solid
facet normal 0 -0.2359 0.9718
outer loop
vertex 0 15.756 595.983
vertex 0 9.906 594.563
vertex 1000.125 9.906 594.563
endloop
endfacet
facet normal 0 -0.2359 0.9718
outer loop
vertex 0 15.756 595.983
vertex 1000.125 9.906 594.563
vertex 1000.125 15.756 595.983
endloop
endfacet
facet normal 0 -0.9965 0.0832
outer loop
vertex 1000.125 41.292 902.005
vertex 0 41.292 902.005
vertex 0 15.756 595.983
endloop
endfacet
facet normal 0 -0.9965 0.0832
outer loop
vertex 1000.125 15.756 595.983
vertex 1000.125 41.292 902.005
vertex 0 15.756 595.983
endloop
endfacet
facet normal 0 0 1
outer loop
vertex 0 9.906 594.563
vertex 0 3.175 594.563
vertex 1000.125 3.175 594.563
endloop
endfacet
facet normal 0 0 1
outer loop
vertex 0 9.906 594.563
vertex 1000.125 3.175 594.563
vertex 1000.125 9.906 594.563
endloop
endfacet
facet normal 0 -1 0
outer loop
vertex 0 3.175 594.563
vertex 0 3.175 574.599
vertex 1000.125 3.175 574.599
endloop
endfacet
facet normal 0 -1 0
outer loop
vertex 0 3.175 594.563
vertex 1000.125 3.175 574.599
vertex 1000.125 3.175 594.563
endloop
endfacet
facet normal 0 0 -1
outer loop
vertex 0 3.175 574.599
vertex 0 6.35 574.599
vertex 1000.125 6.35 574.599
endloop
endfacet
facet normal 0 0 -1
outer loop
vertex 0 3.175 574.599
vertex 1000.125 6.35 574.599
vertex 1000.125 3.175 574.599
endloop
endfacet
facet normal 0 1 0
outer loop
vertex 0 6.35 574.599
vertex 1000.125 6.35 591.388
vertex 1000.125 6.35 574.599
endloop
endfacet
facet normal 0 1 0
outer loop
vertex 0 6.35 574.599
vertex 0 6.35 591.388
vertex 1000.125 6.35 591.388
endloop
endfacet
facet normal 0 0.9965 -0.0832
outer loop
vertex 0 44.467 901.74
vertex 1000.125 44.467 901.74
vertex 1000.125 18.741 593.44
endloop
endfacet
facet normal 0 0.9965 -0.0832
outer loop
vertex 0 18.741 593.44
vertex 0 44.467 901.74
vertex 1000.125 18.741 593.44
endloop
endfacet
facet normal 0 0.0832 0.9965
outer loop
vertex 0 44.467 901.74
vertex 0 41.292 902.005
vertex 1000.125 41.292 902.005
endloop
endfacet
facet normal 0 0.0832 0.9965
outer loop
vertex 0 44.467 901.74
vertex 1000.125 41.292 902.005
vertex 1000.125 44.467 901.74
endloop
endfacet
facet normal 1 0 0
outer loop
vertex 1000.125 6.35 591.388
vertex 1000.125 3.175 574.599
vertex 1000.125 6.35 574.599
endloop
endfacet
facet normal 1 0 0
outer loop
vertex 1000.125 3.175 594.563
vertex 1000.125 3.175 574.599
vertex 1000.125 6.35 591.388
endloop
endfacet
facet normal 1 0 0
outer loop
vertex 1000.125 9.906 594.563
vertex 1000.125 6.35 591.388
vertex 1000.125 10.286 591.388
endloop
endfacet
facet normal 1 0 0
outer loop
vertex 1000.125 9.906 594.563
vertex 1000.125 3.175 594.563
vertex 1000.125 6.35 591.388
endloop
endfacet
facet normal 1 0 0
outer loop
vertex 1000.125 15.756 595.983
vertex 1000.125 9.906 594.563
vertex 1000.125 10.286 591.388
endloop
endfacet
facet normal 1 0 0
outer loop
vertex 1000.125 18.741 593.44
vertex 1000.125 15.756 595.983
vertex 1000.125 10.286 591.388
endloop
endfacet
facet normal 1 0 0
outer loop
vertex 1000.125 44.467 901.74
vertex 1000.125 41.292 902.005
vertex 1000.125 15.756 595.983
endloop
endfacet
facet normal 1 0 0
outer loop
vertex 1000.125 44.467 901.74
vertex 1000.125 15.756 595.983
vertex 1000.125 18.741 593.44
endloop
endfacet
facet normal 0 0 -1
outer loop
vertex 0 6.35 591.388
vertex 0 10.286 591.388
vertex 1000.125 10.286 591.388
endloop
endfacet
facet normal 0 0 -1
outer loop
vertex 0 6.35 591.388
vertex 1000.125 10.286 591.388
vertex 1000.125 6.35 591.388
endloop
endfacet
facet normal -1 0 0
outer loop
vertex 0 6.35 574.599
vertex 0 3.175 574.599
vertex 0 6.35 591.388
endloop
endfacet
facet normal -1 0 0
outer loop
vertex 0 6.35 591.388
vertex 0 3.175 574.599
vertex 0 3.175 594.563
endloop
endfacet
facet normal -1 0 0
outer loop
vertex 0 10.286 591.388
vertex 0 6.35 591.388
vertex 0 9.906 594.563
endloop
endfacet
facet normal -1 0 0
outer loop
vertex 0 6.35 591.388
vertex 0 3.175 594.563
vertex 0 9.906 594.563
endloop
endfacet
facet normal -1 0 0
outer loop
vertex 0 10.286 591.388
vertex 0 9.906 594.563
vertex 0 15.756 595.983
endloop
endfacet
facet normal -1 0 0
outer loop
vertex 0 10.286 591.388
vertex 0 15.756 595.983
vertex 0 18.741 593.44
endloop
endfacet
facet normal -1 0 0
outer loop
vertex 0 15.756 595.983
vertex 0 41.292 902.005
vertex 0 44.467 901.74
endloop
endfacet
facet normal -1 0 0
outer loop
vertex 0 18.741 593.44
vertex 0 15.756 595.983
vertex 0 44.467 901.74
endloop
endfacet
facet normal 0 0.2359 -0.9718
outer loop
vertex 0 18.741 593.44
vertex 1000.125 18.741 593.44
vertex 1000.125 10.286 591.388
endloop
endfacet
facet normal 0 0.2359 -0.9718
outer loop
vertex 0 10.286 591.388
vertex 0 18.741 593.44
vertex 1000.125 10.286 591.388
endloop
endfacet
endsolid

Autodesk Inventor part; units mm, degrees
ref_plane "YZ Plane" through (0, 0, 0) normal (1, 0, 0) x (0, 1, 0)
ref_plane "XZ Plane" through (0, 0, 0) normal (0, 1, 0) x (-1, 0, 0)
ref_plane "XY Plane" through (0, 0, 0) normal (0, 0, 1) x (1, 0, 0)
sketch "Sketch1" plane through (0, 0, 0) normal (1, 0, 0) x (0, 1, 0)
  line L0 (0, 0) -> (0, 597.7382)
  line L1 (0, 0) -> (3.175, 0)
  line L2 (3.175, 0) -> (3.175, 594.5632)
  line L3 (3.175, 594.5632) -> (9.906, 594.5632)
  line L4 (9.906, 594.5632) -> (15.756, 595.9828)
  line L5 (0, 597.7382) -> (9.5263, 597.7382)
  line L6 (9.5263, 597.7382) -> (12.7824, 598.5283)
  line L7 (41.2921, 902.0052) -> (15.756, 595.9828)
  line L8 (12.7824, 598.5283) -> (38.1281, 902.2692)
  line L9 (38.1281, 902.2692) -> (41.2921, 902.0052)
  line L10 (41.2921, 902.0052) -> (44.4671, 901.7403)
  line L11 (44.4671, 901.7403) -> (18.7409, 593.44)
  line L12 (18.7409, 593.44) -> (10.2857, 591.3882)
  line L13 (10.2857, 591.3882) -> (6.35, 591.3882)
  line L14 (6.35, 591.3882) -> (6.35, 574.5988)
  line L15 (6.35, 574.5988) -> (3.175, 574.5988)
  dimension "d0" = 594.5632
  dimension "d1" = 3.175
  dimension "d2" = 6.731
  dimension "d7" = 3.175
  dimension "d8" = 6.0198
  dimension "d9" = 166.36
  dimension "d10" = 3.175
  dimension "d11" = 108.41
  dimension "d12" = 3.175
  dimension "d13" = 307.086
  dimension "d16" = 3.175
  dimension "d18" = 3.175
  dimension "d20" = 307.1025
  dimension "d21" = 8.7006
  dimension "d22" = 3.175
  dimension "d23" = 3.175
  dimension "d24" = 3.9357
  dimension "d25" = 16.7894
extrude "Extrusion2" add sketch "Sketch1" along normal blind 1000.125 contours L2 L3 L4 L7 L10 L11 L12 L13 L14 L15
properties part number "First_Shingle_Over_Intake_Vent_With_Length_39.375_Inches"
